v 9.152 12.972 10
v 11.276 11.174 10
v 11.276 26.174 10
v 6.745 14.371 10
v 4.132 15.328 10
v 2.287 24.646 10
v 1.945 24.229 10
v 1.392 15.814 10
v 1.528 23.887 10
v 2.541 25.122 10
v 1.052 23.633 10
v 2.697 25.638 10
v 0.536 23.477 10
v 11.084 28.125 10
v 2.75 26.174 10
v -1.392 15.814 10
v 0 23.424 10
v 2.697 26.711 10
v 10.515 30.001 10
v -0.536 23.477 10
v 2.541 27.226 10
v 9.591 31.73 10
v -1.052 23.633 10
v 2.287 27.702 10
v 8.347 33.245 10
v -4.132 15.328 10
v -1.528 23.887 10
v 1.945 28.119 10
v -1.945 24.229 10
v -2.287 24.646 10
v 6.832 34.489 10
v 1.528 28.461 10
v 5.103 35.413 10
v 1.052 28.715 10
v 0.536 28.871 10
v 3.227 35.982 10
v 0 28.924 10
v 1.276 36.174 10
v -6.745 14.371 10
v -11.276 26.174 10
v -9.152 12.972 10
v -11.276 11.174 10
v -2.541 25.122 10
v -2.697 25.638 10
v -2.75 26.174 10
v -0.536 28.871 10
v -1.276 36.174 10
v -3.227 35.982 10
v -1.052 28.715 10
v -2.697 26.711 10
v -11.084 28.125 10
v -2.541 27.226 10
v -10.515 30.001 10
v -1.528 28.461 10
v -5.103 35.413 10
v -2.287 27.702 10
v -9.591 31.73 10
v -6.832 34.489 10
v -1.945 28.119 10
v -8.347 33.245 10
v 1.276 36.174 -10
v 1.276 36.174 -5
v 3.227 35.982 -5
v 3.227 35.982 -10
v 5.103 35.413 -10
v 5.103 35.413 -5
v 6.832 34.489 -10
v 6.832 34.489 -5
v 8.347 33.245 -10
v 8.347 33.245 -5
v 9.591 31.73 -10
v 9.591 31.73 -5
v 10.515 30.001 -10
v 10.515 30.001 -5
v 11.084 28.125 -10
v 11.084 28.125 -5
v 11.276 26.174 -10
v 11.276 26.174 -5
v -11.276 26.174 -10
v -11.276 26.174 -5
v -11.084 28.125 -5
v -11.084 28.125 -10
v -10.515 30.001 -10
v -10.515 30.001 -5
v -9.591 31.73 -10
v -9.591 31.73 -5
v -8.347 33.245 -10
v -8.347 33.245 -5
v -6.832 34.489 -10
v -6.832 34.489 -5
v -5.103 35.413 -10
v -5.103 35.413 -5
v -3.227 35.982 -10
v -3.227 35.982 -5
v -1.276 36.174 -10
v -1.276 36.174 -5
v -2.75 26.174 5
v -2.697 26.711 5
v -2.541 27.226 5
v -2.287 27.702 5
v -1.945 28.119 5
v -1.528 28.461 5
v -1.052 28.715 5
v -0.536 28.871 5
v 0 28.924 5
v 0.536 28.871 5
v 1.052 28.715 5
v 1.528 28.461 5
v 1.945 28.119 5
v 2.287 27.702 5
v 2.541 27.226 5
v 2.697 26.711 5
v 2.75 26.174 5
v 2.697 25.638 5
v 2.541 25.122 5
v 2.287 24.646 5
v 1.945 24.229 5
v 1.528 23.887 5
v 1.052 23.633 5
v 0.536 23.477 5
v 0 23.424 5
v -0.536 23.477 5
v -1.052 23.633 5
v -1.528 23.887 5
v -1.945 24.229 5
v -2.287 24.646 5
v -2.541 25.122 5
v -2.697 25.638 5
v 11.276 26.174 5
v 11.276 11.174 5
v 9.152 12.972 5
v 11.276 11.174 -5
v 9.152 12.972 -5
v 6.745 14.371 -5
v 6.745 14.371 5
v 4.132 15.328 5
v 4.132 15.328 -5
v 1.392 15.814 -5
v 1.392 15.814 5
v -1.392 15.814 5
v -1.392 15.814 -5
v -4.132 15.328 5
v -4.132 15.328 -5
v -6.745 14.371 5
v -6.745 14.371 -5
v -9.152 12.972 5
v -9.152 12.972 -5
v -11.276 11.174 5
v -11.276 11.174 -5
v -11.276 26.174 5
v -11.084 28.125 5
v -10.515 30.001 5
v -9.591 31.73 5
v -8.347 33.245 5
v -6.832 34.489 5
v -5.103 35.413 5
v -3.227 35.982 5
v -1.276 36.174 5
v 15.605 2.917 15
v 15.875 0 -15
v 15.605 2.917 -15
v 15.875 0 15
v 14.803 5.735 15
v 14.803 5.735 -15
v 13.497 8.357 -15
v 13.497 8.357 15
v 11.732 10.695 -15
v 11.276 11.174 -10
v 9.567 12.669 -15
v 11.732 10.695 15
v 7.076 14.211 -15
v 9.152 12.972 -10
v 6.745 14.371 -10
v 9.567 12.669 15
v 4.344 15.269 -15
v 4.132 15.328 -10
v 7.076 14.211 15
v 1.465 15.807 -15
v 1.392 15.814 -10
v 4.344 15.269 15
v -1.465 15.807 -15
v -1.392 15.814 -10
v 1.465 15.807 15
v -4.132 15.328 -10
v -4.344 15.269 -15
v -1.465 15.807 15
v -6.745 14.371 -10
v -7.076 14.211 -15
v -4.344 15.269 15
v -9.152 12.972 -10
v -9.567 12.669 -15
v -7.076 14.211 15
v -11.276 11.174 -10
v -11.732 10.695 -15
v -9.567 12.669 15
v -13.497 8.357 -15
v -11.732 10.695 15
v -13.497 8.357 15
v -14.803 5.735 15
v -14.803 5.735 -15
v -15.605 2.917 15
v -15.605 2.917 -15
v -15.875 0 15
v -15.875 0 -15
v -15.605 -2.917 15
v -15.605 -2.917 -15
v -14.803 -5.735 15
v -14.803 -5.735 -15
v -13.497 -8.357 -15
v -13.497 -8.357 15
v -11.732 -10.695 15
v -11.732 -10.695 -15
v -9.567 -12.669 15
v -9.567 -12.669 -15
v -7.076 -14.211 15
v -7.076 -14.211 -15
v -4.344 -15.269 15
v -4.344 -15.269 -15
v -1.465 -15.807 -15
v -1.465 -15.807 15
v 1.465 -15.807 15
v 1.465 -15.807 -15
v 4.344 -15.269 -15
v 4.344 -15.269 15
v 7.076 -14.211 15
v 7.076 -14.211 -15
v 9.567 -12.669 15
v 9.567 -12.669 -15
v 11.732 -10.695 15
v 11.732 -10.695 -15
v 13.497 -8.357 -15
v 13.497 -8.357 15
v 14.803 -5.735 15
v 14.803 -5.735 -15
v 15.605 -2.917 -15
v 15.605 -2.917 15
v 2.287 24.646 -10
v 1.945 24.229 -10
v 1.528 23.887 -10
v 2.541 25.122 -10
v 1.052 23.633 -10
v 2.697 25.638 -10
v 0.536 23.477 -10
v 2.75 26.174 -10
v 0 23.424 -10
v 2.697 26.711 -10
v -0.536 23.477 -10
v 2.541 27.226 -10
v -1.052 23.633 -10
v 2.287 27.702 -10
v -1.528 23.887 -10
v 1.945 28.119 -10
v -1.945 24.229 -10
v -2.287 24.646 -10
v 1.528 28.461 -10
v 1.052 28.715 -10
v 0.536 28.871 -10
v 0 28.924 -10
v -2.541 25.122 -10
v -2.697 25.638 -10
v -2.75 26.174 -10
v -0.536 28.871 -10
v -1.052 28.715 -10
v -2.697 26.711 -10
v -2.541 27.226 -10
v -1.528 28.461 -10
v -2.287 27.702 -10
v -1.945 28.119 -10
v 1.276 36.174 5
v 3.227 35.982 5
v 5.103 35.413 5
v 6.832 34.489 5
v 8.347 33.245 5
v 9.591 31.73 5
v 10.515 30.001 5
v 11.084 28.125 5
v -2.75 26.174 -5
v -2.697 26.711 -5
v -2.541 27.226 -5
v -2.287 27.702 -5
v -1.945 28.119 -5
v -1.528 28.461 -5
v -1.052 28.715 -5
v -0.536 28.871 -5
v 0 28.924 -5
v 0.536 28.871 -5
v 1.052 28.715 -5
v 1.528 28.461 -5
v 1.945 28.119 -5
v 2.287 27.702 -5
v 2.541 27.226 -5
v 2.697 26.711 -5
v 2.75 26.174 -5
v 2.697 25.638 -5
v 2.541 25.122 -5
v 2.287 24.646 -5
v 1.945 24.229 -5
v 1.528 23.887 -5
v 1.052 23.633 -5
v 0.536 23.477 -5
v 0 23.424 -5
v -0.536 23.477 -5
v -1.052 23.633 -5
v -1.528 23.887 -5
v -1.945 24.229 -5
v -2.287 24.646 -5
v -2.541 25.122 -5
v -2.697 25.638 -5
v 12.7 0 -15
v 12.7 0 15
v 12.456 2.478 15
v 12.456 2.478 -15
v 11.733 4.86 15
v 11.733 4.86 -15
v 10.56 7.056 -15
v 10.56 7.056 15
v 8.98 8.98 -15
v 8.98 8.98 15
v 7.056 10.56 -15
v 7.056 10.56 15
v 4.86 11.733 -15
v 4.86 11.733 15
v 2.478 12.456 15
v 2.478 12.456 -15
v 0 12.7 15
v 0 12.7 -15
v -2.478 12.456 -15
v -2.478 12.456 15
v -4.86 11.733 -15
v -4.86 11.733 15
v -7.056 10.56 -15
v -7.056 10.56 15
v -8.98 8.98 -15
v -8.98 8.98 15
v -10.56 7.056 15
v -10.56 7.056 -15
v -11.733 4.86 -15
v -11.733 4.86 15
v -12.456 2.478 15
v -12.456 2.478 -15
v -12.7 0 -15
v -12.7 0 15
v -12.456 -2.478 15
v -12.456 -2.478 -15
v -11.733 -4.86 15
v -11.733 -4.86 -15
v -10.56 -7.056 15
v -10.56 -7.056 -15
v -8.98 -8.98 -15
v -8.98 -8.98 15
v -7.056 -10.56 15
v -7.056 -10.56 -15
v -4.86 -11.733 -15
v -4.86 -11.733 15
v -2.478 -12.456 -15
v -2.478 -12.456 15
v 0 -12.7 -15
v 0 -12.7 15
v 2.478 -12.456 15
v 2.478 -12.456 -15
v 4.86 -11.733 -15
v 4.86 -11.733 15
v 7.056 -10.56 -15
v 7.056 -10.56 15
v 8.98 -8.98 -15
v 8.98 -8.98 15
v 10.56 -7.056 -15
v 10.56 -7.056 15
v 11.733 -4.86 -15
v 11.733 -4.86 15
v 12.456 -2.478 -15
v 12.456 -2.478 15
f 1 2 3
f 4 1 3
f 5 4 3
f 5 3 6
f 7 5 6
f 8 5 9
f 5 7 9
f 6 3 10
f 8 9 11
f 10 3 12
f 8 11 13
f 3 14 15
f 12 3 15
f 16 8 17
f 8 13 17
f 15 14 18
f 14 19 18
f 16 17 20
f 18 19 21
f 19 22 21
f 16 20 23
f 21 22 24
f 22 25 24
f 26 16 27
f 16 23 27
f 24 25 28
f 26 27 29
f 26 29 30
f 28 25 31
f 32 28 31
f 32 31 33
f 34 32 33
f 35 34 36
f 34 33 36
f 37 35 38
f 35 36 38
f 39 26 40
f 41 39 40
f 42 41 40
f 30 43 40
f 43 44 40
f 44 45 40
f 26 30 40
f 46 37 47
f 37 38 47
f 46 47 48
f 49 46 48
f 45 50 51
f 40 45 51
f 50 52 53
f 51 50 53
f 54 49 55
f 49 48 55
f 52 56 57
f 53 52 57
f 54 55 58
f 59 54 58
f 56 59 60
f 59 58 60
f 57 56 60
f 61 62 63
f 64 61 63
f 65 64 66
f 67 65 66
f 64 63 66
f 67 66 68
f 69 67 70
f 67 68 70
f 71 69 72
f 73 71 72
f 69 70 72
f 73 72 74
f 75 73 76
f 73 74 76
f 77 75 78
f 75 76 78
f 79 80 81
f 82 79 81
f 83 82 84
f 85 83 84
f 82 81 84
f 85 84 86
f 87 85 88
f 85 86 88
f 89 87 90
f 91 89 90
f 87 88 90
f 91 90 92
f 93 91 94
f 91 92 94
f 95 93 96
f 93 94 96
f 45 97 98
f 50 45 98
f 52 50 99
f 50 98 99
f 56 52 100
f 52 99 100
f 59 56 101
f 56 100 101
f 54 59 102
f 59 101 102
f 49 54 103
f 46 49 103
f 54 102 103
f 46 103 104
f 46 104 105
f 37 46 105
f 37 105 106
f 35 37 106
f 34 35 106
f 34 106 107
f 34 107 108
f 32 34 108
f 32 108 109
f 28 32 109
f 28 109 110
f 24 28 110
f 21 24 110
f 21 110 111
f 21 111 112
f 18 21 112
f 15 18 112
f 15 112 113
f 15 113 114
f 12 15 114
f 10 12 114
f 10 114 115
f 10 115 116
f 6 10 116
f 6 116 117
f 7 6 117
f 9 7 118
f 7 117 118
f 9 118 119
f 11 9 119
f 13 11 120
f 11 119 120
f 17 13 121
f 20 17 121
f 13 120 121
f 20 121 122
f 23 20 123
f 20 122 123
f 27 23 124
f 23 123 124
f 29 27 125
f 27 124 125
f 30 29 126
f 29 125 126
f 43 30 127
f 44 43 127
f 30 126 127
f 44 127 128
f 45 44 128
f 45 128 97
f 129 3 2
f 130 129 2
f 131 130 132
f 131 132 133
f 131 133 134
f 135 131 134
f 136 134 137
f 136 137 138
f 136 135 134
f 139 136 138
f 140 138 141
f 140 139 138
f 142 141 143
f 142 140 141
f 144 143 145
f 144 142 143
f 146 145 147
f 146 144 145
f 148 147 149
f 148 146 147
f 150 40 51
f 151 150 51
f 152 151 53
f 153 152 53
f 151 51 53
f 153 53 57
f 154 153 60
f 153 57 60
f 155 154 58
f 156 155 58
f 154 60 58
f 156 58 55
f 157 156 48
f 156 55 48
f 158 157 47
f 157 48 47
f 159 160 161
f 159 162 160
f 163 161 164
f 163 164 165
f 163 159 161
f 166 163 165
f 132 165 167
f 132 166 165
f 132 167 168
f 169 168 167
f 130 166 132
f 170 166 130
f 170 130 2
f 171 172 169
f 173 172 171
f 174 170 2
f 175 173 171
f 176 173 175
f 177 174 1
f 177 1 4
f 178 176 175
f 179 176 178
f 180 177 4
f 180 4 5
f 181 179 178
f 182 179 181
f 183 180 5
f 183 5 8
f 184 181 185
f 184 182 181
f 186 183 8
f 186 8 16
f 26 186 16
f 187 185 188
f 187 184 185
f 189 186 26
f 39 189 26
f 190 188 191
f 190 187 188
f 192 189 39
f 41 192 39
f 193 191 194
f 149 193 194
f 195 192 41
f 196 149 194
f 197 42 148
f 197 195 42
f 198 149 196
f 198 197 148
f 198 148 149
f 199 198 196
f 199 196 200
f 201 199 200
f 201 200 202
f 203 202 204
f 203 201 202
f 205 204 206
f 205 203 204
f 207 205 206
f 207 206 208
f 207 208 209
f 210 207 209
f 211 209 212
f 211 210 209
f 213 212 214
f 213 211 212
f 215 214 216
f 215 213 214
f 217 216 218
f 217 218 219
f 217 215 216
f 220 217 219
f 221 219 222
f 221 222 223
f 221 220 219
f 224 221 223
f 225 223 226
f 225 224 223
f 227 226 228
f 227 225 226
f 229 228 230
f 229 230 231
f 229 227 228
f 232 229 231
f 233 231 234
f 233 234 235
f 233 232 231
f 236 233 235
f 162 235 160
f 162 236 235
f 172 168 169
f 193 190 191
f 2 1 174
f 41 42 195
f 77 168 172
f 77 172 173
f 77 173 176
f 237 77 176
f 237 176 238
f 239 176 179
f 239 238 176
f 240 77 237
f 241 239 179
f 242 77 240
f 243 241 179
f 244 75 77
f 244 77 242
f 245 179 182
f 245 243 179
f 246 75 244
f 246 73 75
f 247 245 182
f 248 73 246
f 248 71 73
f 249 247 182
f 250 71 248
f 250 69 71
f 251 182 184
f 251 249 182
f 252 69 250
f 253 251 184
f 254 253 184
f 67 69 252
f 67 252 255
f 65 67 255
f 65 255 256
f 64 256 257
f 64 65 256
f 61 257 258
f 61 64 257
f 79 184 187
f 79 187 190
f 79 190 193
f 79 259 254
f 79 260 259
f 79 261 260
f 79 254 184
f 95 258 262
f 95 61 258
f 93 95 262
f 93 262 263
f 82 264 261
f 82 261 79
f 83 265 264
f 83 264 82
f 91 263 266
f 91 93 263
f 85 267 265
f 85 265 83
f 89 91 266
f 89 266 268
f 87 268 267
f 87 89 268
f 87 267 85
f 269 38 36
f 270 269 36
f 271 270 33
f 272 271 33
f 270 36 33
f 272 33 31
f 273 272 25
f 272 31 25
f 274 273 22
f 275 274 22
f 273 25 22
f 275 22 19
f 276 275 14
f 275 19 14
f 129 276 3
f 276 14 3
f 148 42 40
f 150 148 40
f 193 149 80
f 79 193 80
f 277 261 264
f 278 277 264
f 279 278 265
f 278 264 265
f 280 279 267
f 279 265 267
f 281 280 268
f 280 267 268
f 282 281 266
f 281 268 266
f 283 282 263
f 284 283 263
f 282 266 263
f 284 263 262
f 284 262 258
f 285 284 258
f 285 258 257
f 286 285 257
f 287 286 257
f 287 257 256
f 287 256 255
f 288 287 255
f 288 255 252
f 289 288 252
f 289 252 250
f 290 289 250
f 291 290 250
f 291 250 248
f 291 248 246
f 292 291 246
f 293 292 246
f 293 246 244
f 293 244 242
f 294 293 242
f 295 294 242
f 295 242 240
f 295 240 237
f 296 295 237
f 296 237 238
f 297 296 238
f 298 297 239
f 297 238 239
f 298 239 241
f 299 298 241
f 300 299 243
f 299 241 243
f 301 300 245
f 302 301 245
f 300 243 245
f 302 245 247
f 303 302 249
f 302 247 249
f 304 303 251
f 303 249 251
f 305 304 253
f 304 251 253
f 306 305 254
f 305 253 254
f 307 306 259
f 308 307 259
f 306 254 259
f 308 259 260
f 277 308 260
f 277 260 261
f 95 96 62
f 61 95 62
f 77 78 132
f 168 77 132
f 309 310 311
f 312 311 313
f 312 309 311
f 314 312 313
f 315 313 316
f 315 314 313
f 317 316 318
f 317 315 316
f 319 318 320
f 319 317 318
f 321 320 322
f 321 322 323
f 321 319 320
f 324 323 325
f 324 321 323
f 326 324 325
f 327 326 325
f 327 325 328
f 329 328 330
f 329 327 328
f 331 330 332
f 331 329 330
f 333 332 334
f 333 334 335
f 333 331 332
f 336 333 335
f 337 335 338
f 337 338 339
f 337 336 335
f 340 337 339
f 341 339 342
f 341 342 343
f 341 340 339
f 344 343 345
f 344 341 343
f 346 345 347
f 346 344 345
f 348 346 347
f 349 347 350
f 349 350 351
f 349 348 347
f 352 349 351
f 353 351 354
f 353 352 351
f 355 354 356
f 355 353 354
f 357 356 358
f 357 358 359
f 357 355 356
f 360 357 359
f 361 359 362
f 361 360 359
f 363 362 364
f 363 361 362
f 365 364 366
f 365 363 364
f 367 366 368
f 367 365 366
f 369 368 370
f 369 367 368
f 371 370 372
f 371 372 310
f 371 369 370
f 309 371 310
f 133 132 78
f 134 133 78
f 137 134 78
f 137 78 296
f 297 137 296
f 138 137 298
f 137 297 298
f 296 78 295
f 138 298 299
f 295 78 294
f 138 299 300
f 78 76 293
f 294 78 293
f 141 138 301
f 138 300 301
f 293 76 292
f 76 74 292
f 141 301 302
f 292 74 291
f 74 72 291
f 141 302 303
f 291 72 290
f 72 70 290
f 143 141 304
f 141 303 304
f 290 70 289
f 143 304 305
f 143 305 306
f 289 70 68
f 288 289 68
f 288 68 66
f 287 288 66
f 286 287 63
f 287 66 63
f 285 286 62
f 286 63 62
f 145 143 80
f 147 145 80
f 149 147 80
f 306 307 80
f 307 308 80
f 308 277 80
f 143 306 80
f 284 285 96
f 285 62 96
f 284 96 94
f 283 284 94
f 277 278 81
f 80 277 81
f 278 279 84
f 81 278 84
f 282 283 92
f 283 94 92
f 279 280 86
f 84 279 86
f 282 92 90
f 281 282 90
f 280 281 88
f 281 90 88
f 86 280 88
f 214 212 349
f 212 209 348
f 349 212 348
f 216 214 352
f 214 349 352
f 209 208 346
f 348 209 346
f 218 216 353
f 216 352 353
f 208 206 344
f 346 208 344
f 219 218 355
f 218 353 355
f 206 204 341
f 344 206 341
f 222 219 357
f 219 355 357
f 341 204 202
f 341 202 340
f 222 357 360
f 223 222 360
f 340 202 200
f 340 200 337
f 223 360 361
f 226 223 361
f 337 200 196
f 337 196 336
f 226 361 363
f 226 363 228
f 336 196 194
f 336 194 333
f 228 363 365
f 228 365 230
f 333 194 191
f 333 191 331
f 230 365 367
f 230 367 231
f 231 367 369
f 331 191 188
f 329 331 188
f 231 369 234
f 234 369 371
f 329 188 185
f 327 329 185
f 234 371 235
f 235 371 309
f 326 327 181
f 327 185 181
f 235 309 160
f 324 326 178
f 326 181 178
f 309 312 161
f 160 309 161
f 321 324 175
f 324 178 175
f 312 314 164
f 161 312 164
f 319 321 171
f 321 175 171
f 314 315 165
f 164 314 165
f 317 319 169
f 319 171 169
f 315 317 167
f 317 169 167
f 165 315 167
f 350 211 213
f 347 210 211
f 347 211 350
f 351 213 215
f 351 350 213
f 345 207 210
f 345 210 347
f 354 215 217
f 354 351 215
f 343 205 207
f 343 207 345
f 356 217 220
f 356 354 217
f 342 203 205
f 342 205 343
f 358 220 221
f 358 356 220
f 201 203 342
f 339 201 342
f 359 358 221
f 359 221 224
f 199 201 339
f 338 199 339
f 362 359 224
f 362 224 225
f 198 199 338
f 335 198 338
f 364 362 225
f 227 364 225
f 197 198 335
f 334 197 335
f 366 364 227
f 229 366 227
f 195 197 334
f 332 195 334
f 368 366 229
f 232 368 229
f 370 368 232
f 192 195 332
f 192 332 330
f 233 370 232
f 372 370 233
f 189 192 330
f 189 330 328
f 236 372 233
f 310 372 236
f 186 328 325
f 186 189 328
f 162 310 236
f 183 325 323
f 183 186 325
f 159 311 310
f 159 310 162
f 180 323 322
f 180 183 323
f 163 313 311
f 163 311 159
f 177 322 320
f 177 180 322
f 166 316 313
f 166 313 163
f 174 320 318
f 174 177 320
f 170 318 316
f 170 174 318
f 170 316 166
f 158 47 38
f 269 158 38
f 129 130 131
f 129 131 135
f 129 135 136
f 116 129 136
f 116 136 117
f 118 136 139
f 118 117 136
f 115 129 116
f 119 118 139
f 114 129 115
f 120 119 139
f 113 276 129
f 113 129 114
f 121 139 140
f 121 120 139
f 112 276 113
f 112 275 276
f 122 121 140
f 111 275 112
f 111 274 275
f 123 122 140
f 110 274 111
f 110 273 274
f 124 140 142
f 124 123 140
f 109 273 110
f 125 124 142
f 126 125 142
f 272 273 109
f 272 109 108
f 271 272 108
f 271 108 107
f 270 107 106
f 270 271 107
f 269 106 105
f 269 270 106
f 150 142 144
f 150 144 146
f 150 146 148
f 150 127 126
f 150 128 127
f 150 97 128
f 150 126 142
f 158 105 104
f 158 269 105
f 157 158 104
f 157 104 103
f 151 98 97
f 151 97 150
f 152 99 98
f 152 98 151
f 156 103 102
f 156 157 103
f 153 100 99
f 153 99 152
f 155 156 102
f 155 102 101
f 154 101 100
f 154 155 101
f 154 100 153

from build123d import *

# Parameters (mm, degrees)
SKETCH1_R            = 15.875
SKETCH1_R_2          = 12.7
BOSS_EXTRUDE1_DEPTH  = 15
BOSS_EXTRUDE2_DEPTH  = 10
CUT_EXTRUDE1_DEPTH   = 5
M5_CLEARANCE_HOLE1_D = 5.5


with BuildPart() as part:
    # Sketch1 → Boss-Extrude1 (new, symmetric)
    with BuildSketch(Plane.XY):
        Circle(SKETCH1_R)
        Circle(SKETCH1_R_2, mode=Mode.SUBTRACT)
    extrude(amount=BOSS_EXTRUDE1_DEPTH, both=True)

    # Sketch3 → Boss-Extrude2 (add, symmetric)
    with BuildSketch(Plane.XY):
        with BuildLine():
            Line((-11.276400848, 11.174005948), (-11.276400848, 26.174005948))
            ThreePointArc((-11.276400848, 26.174005948), (-8.34746866, 33.245073759), (-1.276400848, 36.174005948))
            Line((-1.276400848, 36.174005948), (1.276400848, 36.174005948))
            ThreePointArc((1.276400848, 36.174005948), (8.34746866, 33.245073759), (11.276400848, 26.174005948))
            Line((11.276400848, 26.174005948), (11.276400848, 11.174005948))
            ThreePointArc((11.276400848, 11.174005948), (0, 15.875), (-11.276400848, 11.174005948))
        make_face()
    extrude(amount=BOSS_EXTRUDE2_DEPTH, both=True)

    # Sketch3<2> → Cut-Extrude1 (cut, symmetric)
    with BuildSketch(Plane.XY):
        with BuildLine():
            Line((-11.276400848, 11.174005948), (-11.276400848, 26.174005948))
            ThreePointArc((-11.276400848, 26.174005948), (-8.34746866, 33.245073759), (-1.276400848, 36.174005948))
            Line((-1.276400848, 36.174005948), (1.276400848, 36.174005948))
            ThreePointArc((1.276400848, 36.174005948), (8.34746866, 33.245073759), (11.276400848, 26.174005948))
            Line((11.276400848, 26.174005948), (11.276400848, 11.174005948))
            ThreePointArc((11.276400848, 11.174005948), (0, 15.875), (-11.276400848, 11.174005948))
        make_face()
    extrude(amount=CUT_EXTRUDE1_DEPTH, both=True, mode=Mode.SUBTRACT)

    # M5 Clearance Hole1 (through all)
    with Locations(Plane.XY.offset(10)):
        with Locations((0, 26.174005948)):
            Hole(M5_CLEARANCE_HOLE1_D / 2)


solid = part.part
